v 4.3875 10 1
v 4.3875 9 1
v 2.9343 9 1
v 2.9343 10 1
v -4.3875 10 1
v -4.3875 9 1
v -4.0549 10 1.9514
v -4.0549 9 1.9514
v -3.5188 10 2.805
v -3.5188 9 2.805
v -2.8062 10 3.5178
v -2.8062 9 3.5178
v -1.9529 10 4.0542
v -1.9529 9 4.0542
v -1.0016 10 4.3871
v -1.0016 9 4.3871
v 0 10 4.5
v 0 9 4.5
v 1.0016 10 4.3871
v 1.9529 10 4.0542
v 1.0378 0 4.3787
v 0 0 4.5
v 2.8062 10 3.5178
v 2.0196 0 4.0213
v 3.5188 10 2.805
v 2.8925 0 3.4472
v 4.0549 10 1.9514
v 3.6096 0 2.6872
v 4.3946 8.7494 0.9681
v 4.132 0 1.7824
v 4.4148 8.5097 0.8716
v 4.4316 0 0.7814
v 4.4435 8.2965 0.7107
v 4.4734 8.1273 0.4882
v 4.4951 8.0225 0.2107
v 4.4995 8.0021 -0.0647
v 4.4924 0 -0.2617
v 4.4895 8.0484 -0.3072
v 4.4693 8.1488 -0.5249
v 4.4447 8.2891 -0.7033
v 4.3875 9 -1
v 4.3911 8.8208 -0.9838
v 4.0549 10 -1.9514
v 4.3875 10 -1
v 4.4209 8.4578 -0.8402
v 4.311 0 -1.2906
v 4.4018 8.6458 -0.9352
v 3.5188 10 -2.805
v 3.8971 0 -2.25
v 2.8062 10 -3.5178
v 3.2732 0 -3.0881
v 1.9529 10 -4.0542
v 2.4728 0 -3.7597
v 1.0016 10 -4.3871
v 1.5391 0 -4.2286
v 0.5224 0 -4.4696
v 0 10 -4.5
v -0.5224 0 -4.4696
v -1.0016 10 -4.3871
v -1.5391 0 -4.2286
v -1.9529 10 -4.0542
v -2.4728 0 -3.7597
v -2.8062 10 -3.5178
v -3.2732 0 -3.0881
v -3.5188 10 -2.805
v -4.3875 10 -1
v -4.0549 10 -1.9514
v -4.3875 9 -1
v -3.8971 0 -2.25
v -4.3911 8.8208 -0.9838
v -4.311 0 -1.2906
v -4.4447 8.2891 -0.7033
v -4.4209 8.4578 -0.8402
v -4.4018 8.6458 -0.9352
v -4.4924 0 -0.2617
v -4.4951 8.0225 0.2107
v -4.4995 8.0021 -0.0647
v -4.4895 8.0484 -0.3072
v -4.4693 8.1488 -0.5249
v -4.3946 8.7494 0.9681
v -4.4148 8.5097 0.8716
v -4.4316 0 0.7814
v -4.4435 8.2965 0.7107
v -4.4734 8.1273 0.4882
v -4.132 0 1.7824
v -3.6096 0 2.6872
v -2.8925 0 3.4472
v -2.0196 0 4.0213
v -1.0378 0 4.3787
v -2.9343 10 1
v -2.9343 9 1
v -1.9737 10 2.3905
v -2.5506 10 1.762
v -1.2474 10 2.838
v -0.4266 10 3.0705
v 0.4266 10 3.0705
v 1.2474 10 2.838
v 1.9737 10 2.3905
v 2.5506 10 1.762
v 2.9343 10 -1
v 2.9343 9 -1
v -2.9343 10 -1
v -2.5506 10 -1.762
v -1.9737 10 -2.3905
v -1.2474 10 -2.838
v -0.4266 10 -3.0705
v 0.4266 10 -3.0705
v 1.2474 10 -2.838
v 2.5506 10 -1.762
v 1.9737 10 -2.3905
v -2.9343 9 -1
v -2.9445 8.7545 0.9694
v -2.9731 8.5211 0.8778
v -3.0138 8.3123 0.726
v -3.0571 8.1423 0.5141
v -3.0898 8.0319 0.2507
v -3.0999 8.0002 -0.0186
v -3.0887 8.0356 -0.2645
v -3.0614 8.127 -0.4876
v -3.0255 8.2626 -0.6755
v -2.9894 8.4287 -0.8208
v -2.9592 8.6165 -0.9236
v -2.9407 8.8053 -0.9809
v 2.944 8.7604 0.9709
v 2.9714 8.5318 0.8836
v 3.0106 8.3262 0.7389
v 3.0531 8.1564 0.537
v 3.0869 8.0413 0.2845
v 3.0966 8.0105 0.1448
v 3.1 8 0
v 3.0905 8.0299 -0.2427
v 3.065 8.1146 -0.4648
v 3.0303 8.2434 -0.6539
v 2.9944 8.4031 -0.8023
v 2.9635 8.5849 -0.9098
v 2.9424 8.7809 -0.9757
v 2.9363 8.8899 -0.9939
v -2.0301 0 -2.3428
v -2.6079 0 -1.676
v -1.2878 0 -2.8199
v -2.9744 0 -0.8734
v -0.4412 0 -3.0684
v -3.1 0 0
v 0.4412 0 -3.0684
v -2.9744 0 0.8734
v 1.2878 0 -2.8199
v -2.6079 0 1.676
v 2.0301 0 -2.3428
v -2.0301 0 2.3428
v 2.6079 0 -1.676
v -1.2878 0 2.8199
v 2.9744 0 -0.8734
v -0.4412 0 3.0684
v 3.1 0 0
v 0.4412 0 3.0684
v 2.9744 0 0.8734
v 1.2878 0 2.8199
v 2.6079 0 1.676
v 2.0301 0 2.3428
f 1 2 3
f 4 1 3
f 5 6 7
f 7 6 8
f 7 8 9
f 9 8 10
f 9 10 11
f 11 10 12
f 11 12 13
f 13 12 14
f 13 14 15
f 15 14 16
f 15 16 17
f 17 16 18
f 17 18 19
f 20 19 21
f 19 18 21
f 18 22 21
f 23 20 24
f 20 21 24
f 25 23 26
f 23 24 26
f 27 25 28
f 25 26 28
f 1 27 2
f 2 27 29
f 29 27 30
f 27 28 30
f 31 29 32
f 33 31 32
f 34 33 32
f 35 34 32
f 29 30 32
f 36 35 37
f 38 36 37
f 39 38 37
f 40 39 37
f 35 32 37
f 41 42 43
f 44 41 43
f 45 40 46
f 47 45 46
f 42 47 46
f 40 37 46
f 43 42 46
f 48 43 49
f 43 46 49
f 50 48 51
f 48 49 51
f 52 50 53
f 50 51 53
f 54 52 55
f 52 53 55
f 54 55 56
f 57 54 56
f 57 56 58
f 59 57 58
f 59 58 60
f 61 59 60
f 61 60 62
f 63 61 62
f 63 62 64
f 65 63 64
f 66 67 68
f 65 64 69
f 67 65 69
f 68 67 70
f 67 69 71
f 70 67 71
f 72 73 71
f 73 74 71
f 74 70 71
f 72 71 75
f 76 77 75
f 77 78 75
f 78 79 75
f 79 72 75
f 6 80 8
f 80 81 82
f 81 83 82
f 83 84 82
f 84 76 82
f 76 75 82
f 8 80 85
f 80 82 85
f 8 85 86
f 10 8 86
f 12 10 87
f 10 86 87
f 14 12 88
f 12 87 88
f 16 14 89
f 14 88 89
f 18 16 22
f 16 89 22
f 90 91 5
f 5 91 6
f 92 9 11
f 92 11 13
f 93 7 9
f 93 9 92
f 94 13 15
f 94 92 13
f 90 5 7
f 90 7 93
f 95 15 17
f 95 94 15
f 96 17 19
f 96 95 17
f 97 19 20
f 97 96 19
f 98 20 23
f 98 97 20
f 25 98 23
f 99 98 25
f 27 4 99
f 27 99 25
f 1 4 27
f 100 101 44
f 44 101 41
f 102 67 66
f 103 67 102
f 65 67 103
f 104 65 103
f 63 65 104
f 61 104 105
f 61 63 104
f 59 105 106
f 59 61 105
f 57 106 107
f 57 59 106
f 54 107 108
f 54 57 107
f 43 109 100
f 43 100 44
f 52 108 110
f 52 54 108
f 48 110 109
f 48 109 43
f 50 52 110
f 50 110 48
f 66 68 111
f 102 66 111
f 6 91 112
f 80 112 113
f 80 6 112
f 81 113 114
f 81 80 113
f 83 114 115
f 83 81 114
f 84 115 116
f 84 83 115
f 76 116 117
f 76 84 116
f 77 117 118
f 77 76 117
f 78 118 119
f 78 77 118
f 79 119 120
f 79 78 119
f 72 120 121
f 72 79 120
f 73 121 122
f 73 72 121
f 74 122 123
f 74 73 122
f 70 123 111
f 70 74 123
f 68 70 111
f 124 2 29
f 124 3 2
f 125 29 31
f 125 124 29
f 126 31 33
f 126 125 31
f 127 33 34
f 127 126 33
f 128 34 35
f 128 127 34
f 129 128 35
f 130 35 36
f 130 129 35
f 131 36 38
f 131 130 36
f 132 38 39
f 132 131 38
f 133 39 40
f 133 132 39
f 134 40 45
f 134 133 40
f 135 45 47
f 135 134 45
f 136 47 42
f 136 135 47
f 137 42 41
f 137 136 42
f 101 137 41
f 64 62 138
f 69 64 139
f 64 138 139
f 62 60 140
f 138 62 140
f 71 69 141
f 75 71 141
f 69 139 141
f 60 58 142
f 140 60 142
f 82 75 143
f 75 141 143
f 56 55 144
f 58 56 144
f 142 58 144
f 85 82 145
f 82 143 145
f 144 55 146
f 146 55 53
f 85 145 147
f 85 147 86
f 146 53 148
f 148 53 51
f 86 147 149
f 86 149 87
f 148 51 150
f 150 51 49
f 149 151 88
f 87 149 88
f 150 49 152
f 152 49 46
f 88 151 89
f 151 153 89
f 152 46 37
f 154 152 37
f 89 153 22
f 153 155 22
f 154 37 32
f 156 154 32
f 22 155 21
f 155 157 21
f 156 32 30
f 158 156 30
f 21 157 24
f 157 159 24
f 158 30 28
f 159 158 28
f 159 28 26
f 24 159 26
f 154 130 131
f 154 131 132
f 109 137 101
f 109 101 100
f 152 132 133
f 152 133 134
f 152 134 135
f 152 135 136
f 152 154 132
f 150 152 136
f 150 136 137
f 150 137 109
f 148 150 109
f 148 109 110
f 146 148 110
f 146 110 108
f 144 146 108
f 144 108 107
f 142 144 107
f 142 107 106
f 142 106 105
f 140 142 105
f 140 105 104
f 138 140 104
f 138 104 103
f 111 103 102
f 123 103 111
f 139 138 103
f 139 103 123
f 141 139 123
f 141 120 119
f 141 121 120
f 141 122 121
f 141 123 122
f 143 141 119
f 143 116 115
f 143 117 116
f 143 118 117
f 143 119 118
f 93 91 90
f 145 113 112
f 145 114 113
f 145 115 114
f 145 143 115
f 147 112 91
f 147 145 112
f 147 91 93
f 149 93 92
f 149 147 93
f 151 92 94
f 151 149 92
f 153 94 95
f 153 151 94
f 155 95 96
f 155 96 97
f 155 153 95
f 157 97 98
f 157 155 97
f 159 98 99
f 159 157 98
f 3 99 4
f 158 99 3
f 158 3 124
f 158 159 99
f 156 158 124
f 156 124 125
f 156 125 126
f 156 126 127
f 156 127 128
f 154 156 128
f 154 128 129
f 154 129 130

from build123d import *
from build123d.topology import SkipClean

# Parameters (mm, degrees)
SKETCH_1_R               = 4.5
SKETCH_1_R_2             = 3
EXTRUDE_1_DEPTH          = 9
CUT_EXTRUDE_3_DEPTH      = 12.022703843
CUT_EXTRUDE_3_DEPTH_BACK = 12.022703843
SKETCH_2_R               = 1
EXTRUDE_2_DEPTH          = 1
MOVE_FACE_1_OUTLINE_R    = 3.1
MOVE_FACE_1_OUTLINE_R_2  = 3
MOVE_FACE_1_DEPTH        = 10


# Read off the part's stored shape, not the designer's step: 面の移動1
with BuildPart() as part:
    # ｽｹｯﾁ1 → ﾎﾞｽ - 押し出し1 (new body)
    with BuildSketch(Plane(origin=(0, 0, 0), x_dir=(1, 0, 0), z_dir=(0, 1, 0))):
        with Locations(Location((0, 0, 0), (0, 0, 270))):
            Circle(SKETCH_1_R)
        with Locations(Location((0, 0, 0), (0, 0, 270))):
            Circle(SKETCH_1_R_2, mode=Mode.SUBTRACT)
    extrude(amount=EXTRUDE_1_DEPTH)

    # ｽｹｯﾁ2 → ｶｯﾄ - 押し出し3 (cut, two sides: drawn at the far end of the back side and taken through both)
    with BuildSketch(Plane(origin=(0, 0, 0), x_dir=(0, 0, -1), z_dir=(1, 0, 0)).offset(-CUT_EXTRUDE_3_DEPTH_BACK)):
        with Locations((0, 9)):
            Circle(SKETCH_2_R)
    extrude(amount=CUT_EXTRUDE_3_DEPTH + CUT_EXTRUDE_3_DEPTH_BACK, mode=Mode.SUBTRACT)

    # ｽｹｯﾁ3 → ﾎﾞｽ - 押し出し2 (add)
    with SkipClean():  # the faces are left unmerged after this step: merging them gives an invalid solid
        with BuildSketch(Plane(origin=(0, 9, 0), x_dir=(1, 0, 0), z_dir=(0, 1, 0))):
            with BuildLine():
                Line((-2.828427125, -1), (-4.387482194, -1))
                ThreePointArc((-4.387482194, -1), (0, -4.5), (4.387482194, -1))
                Line((4.387482194, -1), (2.828427125, -1))
                ThreePointArc((2.828427125, -1), (0, -3), (-2.828427125, -1))
            make_face()
            with BuildLine():
                Line((2.828427125, 1), (4.387482194, 1))
                ThreePointArc((4.387482194, 1), (0, 4.5), (-4.387482194, 1))
                Line((-4.387482194, 1), (-2.828427125, 1))
                ThreePointArc((-2.828427125, 1), (0, 3), (2.828427125, 1))
            make_face()
        extrude(amount=EXTRUDE_2_DEPTH)

    # Move Face 1 outline → Move Face 1 (cut)
    with BuildSketch(Plane(origin=(0, 0, 0), x_dir=(1, 0, 0), z_dir=(0, 1, 0))):
        Circle(MOVE_FACE_1_OUTLINE_R)
        Circle(MOVE_FACE_1_OUTLINE_R_2, mode=Mode.SUBTRACT)
    extrude(amount=MOVE_FACE_1_DEPTH, mode=Mode.SUBTRACT)


solid = part.part
